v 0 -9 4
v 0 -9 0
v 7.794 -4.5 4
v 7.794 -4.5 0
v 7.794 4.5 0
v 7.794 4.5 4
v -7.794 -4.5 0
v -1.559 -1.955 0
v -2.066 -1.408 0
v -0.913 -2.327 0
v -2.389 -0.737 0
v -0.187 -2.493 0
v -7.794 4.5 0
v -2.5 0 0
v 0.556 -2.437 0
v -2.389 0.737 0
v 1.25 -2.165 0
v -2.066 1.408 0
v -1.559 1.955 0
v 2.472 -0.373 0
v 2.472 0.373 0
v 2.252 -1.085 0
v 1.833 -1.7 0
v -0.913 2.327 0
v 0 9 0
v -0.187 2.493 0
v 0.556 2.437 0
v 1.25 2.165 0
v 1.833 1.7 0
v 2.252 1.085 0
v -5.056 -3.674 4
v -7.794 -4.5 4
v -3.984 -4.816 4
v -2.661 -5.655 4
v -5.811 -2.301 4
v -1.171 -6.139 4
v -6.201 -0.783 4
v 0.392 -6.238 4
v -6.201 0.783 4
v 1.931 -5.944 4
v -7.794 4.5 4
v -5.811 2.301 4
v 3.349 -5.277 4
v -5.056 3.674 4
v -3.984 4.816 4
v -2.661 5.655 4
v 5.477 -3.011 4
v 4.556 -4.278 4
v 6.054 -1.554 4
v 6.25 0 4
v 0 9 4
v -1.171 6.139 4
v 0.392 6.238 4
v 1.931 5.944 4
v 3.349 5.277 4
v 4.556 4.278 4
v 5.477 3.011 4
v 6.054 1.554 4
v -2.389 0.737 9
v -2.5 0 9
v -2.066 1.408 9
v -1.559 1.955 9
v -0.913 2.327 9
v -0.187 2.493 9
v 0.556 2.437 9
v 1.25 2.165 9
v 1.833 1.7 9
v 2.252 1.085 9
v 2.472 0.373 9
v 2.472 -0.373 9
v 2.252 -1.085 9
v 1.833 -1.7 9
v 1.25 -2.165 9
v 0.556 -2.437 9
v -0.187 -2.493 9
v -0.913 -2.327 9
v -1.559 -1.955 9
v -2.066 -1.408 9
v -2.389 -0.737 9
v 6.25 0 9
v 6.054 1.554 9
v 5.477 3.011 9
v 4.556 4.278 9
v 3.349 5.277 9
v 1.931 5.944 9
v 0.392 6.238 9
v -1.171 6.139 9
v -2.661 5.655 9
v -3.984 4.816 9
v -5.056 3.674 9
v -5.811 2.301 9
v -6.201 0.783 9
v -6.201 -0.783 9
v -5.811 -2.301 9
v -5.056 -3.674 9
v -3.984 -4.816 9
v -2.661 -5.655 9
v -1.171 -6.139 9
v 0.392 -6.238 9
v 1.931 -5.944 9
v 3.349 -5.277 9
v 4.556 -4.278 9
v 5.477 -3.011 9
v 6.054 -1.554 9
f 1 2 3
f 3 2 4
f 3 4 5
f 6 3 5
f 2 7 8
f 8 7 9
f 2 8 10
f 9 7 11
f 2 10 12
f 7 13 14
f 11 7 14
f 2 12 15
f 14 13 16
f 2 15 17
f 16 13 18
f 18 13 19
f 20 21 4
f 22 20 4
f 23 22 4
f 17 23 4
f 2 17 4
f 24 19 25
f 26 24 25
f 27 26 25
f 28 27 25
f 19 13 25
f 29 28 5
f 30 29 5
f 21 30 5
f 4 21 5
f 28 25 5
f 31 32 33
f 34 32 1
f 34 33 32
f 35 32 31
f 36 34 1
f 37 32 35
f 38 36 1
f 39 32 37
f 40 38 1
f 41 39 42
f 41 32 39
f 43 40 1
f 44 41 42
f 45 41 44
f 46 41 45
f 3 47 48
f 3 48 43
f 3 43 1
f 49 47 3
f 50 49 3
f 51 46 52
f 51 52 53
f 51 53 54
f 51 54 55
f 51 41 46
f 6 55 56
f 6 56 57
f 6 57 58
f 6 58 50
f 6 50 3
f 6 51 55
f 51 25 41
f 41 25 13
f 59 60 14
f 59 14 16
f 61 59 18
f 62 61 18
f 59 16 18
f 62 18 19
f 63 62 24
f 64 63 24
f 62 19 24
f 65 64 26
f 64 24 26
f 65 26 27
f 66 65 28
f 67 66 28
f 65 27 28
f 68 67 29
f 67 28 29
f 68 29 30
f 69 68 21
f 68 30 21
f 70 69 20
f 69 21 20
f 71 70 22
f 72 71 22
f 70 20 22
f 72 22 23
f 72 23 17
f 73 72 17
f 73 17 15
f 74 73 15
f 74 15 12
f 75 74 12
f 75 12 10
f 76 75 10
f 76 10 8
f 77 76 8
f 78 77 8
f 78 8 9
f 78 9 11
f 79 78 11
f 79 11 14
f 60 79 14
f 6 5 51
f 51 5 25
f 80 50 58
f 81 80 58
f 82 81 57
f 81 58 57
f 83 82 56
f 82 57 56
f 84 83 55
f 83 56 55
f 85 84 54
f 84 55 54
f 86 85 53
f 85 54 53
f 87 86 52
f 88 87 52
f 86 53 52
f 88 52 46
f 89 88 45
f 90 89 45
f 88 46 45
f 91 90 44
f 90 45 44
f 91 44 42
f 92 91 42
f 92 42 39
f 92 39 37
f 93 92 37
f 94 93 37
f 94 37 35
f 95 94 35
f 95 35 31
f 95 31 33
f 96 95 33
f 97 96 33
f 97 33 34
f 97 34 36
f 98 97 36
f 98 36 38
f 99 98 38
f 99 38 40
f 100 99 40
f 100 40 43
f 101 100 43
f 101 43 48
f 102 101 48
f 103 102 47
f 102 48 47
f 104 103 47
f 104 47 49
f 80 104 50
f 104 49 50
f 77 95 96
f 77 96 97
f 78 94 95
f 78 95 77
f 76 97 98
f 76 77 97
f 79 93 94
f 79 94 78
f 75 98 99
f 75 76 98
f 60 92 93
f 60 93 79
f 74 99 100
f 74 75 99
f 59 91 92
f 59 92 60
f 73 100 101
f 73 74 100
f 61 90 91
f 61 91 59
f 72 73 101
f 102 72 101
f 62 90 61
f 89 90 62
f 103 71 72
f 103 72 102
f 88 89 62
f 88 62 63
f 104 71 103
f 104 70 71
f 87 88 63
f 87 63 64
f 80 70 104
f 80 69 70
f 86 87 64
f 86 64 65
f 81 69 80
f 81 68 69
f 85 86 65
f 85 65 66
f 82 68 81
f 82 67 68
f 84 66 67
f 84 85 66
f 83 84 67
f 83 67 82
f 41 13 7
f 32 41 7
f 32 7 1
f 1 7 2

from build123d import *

# Parameters (mm, degrees)
F2_DEPTH = 4
F1_R     = 6.25
F3_DEPTH = 9
F5_D     = 5


with BuildPart() as f2:
    # F0 (on Top) → F2 (new body)
    with BuildSketch(Plane.XY):
        Polygon((-7.794229, 4.5), (-7.794229, -4.5), (0, -9), (7.794229, -4.5), (7.794229, 4.5), (0, 9), align=None)
    extrude(amount=F2_DEPTH)

    # F1 (on Top) → F3 (join)
    with BuildSketch(Plane.XY):
        Circle(F1_R)
    extrude(amount=F3_DEPTH)

    # F5 (through all)
    with Locations(Plane.XY.offset(9)):
        with Locations((0, 0)):
            Hole(F5_D / 2)


solid = f2.part
